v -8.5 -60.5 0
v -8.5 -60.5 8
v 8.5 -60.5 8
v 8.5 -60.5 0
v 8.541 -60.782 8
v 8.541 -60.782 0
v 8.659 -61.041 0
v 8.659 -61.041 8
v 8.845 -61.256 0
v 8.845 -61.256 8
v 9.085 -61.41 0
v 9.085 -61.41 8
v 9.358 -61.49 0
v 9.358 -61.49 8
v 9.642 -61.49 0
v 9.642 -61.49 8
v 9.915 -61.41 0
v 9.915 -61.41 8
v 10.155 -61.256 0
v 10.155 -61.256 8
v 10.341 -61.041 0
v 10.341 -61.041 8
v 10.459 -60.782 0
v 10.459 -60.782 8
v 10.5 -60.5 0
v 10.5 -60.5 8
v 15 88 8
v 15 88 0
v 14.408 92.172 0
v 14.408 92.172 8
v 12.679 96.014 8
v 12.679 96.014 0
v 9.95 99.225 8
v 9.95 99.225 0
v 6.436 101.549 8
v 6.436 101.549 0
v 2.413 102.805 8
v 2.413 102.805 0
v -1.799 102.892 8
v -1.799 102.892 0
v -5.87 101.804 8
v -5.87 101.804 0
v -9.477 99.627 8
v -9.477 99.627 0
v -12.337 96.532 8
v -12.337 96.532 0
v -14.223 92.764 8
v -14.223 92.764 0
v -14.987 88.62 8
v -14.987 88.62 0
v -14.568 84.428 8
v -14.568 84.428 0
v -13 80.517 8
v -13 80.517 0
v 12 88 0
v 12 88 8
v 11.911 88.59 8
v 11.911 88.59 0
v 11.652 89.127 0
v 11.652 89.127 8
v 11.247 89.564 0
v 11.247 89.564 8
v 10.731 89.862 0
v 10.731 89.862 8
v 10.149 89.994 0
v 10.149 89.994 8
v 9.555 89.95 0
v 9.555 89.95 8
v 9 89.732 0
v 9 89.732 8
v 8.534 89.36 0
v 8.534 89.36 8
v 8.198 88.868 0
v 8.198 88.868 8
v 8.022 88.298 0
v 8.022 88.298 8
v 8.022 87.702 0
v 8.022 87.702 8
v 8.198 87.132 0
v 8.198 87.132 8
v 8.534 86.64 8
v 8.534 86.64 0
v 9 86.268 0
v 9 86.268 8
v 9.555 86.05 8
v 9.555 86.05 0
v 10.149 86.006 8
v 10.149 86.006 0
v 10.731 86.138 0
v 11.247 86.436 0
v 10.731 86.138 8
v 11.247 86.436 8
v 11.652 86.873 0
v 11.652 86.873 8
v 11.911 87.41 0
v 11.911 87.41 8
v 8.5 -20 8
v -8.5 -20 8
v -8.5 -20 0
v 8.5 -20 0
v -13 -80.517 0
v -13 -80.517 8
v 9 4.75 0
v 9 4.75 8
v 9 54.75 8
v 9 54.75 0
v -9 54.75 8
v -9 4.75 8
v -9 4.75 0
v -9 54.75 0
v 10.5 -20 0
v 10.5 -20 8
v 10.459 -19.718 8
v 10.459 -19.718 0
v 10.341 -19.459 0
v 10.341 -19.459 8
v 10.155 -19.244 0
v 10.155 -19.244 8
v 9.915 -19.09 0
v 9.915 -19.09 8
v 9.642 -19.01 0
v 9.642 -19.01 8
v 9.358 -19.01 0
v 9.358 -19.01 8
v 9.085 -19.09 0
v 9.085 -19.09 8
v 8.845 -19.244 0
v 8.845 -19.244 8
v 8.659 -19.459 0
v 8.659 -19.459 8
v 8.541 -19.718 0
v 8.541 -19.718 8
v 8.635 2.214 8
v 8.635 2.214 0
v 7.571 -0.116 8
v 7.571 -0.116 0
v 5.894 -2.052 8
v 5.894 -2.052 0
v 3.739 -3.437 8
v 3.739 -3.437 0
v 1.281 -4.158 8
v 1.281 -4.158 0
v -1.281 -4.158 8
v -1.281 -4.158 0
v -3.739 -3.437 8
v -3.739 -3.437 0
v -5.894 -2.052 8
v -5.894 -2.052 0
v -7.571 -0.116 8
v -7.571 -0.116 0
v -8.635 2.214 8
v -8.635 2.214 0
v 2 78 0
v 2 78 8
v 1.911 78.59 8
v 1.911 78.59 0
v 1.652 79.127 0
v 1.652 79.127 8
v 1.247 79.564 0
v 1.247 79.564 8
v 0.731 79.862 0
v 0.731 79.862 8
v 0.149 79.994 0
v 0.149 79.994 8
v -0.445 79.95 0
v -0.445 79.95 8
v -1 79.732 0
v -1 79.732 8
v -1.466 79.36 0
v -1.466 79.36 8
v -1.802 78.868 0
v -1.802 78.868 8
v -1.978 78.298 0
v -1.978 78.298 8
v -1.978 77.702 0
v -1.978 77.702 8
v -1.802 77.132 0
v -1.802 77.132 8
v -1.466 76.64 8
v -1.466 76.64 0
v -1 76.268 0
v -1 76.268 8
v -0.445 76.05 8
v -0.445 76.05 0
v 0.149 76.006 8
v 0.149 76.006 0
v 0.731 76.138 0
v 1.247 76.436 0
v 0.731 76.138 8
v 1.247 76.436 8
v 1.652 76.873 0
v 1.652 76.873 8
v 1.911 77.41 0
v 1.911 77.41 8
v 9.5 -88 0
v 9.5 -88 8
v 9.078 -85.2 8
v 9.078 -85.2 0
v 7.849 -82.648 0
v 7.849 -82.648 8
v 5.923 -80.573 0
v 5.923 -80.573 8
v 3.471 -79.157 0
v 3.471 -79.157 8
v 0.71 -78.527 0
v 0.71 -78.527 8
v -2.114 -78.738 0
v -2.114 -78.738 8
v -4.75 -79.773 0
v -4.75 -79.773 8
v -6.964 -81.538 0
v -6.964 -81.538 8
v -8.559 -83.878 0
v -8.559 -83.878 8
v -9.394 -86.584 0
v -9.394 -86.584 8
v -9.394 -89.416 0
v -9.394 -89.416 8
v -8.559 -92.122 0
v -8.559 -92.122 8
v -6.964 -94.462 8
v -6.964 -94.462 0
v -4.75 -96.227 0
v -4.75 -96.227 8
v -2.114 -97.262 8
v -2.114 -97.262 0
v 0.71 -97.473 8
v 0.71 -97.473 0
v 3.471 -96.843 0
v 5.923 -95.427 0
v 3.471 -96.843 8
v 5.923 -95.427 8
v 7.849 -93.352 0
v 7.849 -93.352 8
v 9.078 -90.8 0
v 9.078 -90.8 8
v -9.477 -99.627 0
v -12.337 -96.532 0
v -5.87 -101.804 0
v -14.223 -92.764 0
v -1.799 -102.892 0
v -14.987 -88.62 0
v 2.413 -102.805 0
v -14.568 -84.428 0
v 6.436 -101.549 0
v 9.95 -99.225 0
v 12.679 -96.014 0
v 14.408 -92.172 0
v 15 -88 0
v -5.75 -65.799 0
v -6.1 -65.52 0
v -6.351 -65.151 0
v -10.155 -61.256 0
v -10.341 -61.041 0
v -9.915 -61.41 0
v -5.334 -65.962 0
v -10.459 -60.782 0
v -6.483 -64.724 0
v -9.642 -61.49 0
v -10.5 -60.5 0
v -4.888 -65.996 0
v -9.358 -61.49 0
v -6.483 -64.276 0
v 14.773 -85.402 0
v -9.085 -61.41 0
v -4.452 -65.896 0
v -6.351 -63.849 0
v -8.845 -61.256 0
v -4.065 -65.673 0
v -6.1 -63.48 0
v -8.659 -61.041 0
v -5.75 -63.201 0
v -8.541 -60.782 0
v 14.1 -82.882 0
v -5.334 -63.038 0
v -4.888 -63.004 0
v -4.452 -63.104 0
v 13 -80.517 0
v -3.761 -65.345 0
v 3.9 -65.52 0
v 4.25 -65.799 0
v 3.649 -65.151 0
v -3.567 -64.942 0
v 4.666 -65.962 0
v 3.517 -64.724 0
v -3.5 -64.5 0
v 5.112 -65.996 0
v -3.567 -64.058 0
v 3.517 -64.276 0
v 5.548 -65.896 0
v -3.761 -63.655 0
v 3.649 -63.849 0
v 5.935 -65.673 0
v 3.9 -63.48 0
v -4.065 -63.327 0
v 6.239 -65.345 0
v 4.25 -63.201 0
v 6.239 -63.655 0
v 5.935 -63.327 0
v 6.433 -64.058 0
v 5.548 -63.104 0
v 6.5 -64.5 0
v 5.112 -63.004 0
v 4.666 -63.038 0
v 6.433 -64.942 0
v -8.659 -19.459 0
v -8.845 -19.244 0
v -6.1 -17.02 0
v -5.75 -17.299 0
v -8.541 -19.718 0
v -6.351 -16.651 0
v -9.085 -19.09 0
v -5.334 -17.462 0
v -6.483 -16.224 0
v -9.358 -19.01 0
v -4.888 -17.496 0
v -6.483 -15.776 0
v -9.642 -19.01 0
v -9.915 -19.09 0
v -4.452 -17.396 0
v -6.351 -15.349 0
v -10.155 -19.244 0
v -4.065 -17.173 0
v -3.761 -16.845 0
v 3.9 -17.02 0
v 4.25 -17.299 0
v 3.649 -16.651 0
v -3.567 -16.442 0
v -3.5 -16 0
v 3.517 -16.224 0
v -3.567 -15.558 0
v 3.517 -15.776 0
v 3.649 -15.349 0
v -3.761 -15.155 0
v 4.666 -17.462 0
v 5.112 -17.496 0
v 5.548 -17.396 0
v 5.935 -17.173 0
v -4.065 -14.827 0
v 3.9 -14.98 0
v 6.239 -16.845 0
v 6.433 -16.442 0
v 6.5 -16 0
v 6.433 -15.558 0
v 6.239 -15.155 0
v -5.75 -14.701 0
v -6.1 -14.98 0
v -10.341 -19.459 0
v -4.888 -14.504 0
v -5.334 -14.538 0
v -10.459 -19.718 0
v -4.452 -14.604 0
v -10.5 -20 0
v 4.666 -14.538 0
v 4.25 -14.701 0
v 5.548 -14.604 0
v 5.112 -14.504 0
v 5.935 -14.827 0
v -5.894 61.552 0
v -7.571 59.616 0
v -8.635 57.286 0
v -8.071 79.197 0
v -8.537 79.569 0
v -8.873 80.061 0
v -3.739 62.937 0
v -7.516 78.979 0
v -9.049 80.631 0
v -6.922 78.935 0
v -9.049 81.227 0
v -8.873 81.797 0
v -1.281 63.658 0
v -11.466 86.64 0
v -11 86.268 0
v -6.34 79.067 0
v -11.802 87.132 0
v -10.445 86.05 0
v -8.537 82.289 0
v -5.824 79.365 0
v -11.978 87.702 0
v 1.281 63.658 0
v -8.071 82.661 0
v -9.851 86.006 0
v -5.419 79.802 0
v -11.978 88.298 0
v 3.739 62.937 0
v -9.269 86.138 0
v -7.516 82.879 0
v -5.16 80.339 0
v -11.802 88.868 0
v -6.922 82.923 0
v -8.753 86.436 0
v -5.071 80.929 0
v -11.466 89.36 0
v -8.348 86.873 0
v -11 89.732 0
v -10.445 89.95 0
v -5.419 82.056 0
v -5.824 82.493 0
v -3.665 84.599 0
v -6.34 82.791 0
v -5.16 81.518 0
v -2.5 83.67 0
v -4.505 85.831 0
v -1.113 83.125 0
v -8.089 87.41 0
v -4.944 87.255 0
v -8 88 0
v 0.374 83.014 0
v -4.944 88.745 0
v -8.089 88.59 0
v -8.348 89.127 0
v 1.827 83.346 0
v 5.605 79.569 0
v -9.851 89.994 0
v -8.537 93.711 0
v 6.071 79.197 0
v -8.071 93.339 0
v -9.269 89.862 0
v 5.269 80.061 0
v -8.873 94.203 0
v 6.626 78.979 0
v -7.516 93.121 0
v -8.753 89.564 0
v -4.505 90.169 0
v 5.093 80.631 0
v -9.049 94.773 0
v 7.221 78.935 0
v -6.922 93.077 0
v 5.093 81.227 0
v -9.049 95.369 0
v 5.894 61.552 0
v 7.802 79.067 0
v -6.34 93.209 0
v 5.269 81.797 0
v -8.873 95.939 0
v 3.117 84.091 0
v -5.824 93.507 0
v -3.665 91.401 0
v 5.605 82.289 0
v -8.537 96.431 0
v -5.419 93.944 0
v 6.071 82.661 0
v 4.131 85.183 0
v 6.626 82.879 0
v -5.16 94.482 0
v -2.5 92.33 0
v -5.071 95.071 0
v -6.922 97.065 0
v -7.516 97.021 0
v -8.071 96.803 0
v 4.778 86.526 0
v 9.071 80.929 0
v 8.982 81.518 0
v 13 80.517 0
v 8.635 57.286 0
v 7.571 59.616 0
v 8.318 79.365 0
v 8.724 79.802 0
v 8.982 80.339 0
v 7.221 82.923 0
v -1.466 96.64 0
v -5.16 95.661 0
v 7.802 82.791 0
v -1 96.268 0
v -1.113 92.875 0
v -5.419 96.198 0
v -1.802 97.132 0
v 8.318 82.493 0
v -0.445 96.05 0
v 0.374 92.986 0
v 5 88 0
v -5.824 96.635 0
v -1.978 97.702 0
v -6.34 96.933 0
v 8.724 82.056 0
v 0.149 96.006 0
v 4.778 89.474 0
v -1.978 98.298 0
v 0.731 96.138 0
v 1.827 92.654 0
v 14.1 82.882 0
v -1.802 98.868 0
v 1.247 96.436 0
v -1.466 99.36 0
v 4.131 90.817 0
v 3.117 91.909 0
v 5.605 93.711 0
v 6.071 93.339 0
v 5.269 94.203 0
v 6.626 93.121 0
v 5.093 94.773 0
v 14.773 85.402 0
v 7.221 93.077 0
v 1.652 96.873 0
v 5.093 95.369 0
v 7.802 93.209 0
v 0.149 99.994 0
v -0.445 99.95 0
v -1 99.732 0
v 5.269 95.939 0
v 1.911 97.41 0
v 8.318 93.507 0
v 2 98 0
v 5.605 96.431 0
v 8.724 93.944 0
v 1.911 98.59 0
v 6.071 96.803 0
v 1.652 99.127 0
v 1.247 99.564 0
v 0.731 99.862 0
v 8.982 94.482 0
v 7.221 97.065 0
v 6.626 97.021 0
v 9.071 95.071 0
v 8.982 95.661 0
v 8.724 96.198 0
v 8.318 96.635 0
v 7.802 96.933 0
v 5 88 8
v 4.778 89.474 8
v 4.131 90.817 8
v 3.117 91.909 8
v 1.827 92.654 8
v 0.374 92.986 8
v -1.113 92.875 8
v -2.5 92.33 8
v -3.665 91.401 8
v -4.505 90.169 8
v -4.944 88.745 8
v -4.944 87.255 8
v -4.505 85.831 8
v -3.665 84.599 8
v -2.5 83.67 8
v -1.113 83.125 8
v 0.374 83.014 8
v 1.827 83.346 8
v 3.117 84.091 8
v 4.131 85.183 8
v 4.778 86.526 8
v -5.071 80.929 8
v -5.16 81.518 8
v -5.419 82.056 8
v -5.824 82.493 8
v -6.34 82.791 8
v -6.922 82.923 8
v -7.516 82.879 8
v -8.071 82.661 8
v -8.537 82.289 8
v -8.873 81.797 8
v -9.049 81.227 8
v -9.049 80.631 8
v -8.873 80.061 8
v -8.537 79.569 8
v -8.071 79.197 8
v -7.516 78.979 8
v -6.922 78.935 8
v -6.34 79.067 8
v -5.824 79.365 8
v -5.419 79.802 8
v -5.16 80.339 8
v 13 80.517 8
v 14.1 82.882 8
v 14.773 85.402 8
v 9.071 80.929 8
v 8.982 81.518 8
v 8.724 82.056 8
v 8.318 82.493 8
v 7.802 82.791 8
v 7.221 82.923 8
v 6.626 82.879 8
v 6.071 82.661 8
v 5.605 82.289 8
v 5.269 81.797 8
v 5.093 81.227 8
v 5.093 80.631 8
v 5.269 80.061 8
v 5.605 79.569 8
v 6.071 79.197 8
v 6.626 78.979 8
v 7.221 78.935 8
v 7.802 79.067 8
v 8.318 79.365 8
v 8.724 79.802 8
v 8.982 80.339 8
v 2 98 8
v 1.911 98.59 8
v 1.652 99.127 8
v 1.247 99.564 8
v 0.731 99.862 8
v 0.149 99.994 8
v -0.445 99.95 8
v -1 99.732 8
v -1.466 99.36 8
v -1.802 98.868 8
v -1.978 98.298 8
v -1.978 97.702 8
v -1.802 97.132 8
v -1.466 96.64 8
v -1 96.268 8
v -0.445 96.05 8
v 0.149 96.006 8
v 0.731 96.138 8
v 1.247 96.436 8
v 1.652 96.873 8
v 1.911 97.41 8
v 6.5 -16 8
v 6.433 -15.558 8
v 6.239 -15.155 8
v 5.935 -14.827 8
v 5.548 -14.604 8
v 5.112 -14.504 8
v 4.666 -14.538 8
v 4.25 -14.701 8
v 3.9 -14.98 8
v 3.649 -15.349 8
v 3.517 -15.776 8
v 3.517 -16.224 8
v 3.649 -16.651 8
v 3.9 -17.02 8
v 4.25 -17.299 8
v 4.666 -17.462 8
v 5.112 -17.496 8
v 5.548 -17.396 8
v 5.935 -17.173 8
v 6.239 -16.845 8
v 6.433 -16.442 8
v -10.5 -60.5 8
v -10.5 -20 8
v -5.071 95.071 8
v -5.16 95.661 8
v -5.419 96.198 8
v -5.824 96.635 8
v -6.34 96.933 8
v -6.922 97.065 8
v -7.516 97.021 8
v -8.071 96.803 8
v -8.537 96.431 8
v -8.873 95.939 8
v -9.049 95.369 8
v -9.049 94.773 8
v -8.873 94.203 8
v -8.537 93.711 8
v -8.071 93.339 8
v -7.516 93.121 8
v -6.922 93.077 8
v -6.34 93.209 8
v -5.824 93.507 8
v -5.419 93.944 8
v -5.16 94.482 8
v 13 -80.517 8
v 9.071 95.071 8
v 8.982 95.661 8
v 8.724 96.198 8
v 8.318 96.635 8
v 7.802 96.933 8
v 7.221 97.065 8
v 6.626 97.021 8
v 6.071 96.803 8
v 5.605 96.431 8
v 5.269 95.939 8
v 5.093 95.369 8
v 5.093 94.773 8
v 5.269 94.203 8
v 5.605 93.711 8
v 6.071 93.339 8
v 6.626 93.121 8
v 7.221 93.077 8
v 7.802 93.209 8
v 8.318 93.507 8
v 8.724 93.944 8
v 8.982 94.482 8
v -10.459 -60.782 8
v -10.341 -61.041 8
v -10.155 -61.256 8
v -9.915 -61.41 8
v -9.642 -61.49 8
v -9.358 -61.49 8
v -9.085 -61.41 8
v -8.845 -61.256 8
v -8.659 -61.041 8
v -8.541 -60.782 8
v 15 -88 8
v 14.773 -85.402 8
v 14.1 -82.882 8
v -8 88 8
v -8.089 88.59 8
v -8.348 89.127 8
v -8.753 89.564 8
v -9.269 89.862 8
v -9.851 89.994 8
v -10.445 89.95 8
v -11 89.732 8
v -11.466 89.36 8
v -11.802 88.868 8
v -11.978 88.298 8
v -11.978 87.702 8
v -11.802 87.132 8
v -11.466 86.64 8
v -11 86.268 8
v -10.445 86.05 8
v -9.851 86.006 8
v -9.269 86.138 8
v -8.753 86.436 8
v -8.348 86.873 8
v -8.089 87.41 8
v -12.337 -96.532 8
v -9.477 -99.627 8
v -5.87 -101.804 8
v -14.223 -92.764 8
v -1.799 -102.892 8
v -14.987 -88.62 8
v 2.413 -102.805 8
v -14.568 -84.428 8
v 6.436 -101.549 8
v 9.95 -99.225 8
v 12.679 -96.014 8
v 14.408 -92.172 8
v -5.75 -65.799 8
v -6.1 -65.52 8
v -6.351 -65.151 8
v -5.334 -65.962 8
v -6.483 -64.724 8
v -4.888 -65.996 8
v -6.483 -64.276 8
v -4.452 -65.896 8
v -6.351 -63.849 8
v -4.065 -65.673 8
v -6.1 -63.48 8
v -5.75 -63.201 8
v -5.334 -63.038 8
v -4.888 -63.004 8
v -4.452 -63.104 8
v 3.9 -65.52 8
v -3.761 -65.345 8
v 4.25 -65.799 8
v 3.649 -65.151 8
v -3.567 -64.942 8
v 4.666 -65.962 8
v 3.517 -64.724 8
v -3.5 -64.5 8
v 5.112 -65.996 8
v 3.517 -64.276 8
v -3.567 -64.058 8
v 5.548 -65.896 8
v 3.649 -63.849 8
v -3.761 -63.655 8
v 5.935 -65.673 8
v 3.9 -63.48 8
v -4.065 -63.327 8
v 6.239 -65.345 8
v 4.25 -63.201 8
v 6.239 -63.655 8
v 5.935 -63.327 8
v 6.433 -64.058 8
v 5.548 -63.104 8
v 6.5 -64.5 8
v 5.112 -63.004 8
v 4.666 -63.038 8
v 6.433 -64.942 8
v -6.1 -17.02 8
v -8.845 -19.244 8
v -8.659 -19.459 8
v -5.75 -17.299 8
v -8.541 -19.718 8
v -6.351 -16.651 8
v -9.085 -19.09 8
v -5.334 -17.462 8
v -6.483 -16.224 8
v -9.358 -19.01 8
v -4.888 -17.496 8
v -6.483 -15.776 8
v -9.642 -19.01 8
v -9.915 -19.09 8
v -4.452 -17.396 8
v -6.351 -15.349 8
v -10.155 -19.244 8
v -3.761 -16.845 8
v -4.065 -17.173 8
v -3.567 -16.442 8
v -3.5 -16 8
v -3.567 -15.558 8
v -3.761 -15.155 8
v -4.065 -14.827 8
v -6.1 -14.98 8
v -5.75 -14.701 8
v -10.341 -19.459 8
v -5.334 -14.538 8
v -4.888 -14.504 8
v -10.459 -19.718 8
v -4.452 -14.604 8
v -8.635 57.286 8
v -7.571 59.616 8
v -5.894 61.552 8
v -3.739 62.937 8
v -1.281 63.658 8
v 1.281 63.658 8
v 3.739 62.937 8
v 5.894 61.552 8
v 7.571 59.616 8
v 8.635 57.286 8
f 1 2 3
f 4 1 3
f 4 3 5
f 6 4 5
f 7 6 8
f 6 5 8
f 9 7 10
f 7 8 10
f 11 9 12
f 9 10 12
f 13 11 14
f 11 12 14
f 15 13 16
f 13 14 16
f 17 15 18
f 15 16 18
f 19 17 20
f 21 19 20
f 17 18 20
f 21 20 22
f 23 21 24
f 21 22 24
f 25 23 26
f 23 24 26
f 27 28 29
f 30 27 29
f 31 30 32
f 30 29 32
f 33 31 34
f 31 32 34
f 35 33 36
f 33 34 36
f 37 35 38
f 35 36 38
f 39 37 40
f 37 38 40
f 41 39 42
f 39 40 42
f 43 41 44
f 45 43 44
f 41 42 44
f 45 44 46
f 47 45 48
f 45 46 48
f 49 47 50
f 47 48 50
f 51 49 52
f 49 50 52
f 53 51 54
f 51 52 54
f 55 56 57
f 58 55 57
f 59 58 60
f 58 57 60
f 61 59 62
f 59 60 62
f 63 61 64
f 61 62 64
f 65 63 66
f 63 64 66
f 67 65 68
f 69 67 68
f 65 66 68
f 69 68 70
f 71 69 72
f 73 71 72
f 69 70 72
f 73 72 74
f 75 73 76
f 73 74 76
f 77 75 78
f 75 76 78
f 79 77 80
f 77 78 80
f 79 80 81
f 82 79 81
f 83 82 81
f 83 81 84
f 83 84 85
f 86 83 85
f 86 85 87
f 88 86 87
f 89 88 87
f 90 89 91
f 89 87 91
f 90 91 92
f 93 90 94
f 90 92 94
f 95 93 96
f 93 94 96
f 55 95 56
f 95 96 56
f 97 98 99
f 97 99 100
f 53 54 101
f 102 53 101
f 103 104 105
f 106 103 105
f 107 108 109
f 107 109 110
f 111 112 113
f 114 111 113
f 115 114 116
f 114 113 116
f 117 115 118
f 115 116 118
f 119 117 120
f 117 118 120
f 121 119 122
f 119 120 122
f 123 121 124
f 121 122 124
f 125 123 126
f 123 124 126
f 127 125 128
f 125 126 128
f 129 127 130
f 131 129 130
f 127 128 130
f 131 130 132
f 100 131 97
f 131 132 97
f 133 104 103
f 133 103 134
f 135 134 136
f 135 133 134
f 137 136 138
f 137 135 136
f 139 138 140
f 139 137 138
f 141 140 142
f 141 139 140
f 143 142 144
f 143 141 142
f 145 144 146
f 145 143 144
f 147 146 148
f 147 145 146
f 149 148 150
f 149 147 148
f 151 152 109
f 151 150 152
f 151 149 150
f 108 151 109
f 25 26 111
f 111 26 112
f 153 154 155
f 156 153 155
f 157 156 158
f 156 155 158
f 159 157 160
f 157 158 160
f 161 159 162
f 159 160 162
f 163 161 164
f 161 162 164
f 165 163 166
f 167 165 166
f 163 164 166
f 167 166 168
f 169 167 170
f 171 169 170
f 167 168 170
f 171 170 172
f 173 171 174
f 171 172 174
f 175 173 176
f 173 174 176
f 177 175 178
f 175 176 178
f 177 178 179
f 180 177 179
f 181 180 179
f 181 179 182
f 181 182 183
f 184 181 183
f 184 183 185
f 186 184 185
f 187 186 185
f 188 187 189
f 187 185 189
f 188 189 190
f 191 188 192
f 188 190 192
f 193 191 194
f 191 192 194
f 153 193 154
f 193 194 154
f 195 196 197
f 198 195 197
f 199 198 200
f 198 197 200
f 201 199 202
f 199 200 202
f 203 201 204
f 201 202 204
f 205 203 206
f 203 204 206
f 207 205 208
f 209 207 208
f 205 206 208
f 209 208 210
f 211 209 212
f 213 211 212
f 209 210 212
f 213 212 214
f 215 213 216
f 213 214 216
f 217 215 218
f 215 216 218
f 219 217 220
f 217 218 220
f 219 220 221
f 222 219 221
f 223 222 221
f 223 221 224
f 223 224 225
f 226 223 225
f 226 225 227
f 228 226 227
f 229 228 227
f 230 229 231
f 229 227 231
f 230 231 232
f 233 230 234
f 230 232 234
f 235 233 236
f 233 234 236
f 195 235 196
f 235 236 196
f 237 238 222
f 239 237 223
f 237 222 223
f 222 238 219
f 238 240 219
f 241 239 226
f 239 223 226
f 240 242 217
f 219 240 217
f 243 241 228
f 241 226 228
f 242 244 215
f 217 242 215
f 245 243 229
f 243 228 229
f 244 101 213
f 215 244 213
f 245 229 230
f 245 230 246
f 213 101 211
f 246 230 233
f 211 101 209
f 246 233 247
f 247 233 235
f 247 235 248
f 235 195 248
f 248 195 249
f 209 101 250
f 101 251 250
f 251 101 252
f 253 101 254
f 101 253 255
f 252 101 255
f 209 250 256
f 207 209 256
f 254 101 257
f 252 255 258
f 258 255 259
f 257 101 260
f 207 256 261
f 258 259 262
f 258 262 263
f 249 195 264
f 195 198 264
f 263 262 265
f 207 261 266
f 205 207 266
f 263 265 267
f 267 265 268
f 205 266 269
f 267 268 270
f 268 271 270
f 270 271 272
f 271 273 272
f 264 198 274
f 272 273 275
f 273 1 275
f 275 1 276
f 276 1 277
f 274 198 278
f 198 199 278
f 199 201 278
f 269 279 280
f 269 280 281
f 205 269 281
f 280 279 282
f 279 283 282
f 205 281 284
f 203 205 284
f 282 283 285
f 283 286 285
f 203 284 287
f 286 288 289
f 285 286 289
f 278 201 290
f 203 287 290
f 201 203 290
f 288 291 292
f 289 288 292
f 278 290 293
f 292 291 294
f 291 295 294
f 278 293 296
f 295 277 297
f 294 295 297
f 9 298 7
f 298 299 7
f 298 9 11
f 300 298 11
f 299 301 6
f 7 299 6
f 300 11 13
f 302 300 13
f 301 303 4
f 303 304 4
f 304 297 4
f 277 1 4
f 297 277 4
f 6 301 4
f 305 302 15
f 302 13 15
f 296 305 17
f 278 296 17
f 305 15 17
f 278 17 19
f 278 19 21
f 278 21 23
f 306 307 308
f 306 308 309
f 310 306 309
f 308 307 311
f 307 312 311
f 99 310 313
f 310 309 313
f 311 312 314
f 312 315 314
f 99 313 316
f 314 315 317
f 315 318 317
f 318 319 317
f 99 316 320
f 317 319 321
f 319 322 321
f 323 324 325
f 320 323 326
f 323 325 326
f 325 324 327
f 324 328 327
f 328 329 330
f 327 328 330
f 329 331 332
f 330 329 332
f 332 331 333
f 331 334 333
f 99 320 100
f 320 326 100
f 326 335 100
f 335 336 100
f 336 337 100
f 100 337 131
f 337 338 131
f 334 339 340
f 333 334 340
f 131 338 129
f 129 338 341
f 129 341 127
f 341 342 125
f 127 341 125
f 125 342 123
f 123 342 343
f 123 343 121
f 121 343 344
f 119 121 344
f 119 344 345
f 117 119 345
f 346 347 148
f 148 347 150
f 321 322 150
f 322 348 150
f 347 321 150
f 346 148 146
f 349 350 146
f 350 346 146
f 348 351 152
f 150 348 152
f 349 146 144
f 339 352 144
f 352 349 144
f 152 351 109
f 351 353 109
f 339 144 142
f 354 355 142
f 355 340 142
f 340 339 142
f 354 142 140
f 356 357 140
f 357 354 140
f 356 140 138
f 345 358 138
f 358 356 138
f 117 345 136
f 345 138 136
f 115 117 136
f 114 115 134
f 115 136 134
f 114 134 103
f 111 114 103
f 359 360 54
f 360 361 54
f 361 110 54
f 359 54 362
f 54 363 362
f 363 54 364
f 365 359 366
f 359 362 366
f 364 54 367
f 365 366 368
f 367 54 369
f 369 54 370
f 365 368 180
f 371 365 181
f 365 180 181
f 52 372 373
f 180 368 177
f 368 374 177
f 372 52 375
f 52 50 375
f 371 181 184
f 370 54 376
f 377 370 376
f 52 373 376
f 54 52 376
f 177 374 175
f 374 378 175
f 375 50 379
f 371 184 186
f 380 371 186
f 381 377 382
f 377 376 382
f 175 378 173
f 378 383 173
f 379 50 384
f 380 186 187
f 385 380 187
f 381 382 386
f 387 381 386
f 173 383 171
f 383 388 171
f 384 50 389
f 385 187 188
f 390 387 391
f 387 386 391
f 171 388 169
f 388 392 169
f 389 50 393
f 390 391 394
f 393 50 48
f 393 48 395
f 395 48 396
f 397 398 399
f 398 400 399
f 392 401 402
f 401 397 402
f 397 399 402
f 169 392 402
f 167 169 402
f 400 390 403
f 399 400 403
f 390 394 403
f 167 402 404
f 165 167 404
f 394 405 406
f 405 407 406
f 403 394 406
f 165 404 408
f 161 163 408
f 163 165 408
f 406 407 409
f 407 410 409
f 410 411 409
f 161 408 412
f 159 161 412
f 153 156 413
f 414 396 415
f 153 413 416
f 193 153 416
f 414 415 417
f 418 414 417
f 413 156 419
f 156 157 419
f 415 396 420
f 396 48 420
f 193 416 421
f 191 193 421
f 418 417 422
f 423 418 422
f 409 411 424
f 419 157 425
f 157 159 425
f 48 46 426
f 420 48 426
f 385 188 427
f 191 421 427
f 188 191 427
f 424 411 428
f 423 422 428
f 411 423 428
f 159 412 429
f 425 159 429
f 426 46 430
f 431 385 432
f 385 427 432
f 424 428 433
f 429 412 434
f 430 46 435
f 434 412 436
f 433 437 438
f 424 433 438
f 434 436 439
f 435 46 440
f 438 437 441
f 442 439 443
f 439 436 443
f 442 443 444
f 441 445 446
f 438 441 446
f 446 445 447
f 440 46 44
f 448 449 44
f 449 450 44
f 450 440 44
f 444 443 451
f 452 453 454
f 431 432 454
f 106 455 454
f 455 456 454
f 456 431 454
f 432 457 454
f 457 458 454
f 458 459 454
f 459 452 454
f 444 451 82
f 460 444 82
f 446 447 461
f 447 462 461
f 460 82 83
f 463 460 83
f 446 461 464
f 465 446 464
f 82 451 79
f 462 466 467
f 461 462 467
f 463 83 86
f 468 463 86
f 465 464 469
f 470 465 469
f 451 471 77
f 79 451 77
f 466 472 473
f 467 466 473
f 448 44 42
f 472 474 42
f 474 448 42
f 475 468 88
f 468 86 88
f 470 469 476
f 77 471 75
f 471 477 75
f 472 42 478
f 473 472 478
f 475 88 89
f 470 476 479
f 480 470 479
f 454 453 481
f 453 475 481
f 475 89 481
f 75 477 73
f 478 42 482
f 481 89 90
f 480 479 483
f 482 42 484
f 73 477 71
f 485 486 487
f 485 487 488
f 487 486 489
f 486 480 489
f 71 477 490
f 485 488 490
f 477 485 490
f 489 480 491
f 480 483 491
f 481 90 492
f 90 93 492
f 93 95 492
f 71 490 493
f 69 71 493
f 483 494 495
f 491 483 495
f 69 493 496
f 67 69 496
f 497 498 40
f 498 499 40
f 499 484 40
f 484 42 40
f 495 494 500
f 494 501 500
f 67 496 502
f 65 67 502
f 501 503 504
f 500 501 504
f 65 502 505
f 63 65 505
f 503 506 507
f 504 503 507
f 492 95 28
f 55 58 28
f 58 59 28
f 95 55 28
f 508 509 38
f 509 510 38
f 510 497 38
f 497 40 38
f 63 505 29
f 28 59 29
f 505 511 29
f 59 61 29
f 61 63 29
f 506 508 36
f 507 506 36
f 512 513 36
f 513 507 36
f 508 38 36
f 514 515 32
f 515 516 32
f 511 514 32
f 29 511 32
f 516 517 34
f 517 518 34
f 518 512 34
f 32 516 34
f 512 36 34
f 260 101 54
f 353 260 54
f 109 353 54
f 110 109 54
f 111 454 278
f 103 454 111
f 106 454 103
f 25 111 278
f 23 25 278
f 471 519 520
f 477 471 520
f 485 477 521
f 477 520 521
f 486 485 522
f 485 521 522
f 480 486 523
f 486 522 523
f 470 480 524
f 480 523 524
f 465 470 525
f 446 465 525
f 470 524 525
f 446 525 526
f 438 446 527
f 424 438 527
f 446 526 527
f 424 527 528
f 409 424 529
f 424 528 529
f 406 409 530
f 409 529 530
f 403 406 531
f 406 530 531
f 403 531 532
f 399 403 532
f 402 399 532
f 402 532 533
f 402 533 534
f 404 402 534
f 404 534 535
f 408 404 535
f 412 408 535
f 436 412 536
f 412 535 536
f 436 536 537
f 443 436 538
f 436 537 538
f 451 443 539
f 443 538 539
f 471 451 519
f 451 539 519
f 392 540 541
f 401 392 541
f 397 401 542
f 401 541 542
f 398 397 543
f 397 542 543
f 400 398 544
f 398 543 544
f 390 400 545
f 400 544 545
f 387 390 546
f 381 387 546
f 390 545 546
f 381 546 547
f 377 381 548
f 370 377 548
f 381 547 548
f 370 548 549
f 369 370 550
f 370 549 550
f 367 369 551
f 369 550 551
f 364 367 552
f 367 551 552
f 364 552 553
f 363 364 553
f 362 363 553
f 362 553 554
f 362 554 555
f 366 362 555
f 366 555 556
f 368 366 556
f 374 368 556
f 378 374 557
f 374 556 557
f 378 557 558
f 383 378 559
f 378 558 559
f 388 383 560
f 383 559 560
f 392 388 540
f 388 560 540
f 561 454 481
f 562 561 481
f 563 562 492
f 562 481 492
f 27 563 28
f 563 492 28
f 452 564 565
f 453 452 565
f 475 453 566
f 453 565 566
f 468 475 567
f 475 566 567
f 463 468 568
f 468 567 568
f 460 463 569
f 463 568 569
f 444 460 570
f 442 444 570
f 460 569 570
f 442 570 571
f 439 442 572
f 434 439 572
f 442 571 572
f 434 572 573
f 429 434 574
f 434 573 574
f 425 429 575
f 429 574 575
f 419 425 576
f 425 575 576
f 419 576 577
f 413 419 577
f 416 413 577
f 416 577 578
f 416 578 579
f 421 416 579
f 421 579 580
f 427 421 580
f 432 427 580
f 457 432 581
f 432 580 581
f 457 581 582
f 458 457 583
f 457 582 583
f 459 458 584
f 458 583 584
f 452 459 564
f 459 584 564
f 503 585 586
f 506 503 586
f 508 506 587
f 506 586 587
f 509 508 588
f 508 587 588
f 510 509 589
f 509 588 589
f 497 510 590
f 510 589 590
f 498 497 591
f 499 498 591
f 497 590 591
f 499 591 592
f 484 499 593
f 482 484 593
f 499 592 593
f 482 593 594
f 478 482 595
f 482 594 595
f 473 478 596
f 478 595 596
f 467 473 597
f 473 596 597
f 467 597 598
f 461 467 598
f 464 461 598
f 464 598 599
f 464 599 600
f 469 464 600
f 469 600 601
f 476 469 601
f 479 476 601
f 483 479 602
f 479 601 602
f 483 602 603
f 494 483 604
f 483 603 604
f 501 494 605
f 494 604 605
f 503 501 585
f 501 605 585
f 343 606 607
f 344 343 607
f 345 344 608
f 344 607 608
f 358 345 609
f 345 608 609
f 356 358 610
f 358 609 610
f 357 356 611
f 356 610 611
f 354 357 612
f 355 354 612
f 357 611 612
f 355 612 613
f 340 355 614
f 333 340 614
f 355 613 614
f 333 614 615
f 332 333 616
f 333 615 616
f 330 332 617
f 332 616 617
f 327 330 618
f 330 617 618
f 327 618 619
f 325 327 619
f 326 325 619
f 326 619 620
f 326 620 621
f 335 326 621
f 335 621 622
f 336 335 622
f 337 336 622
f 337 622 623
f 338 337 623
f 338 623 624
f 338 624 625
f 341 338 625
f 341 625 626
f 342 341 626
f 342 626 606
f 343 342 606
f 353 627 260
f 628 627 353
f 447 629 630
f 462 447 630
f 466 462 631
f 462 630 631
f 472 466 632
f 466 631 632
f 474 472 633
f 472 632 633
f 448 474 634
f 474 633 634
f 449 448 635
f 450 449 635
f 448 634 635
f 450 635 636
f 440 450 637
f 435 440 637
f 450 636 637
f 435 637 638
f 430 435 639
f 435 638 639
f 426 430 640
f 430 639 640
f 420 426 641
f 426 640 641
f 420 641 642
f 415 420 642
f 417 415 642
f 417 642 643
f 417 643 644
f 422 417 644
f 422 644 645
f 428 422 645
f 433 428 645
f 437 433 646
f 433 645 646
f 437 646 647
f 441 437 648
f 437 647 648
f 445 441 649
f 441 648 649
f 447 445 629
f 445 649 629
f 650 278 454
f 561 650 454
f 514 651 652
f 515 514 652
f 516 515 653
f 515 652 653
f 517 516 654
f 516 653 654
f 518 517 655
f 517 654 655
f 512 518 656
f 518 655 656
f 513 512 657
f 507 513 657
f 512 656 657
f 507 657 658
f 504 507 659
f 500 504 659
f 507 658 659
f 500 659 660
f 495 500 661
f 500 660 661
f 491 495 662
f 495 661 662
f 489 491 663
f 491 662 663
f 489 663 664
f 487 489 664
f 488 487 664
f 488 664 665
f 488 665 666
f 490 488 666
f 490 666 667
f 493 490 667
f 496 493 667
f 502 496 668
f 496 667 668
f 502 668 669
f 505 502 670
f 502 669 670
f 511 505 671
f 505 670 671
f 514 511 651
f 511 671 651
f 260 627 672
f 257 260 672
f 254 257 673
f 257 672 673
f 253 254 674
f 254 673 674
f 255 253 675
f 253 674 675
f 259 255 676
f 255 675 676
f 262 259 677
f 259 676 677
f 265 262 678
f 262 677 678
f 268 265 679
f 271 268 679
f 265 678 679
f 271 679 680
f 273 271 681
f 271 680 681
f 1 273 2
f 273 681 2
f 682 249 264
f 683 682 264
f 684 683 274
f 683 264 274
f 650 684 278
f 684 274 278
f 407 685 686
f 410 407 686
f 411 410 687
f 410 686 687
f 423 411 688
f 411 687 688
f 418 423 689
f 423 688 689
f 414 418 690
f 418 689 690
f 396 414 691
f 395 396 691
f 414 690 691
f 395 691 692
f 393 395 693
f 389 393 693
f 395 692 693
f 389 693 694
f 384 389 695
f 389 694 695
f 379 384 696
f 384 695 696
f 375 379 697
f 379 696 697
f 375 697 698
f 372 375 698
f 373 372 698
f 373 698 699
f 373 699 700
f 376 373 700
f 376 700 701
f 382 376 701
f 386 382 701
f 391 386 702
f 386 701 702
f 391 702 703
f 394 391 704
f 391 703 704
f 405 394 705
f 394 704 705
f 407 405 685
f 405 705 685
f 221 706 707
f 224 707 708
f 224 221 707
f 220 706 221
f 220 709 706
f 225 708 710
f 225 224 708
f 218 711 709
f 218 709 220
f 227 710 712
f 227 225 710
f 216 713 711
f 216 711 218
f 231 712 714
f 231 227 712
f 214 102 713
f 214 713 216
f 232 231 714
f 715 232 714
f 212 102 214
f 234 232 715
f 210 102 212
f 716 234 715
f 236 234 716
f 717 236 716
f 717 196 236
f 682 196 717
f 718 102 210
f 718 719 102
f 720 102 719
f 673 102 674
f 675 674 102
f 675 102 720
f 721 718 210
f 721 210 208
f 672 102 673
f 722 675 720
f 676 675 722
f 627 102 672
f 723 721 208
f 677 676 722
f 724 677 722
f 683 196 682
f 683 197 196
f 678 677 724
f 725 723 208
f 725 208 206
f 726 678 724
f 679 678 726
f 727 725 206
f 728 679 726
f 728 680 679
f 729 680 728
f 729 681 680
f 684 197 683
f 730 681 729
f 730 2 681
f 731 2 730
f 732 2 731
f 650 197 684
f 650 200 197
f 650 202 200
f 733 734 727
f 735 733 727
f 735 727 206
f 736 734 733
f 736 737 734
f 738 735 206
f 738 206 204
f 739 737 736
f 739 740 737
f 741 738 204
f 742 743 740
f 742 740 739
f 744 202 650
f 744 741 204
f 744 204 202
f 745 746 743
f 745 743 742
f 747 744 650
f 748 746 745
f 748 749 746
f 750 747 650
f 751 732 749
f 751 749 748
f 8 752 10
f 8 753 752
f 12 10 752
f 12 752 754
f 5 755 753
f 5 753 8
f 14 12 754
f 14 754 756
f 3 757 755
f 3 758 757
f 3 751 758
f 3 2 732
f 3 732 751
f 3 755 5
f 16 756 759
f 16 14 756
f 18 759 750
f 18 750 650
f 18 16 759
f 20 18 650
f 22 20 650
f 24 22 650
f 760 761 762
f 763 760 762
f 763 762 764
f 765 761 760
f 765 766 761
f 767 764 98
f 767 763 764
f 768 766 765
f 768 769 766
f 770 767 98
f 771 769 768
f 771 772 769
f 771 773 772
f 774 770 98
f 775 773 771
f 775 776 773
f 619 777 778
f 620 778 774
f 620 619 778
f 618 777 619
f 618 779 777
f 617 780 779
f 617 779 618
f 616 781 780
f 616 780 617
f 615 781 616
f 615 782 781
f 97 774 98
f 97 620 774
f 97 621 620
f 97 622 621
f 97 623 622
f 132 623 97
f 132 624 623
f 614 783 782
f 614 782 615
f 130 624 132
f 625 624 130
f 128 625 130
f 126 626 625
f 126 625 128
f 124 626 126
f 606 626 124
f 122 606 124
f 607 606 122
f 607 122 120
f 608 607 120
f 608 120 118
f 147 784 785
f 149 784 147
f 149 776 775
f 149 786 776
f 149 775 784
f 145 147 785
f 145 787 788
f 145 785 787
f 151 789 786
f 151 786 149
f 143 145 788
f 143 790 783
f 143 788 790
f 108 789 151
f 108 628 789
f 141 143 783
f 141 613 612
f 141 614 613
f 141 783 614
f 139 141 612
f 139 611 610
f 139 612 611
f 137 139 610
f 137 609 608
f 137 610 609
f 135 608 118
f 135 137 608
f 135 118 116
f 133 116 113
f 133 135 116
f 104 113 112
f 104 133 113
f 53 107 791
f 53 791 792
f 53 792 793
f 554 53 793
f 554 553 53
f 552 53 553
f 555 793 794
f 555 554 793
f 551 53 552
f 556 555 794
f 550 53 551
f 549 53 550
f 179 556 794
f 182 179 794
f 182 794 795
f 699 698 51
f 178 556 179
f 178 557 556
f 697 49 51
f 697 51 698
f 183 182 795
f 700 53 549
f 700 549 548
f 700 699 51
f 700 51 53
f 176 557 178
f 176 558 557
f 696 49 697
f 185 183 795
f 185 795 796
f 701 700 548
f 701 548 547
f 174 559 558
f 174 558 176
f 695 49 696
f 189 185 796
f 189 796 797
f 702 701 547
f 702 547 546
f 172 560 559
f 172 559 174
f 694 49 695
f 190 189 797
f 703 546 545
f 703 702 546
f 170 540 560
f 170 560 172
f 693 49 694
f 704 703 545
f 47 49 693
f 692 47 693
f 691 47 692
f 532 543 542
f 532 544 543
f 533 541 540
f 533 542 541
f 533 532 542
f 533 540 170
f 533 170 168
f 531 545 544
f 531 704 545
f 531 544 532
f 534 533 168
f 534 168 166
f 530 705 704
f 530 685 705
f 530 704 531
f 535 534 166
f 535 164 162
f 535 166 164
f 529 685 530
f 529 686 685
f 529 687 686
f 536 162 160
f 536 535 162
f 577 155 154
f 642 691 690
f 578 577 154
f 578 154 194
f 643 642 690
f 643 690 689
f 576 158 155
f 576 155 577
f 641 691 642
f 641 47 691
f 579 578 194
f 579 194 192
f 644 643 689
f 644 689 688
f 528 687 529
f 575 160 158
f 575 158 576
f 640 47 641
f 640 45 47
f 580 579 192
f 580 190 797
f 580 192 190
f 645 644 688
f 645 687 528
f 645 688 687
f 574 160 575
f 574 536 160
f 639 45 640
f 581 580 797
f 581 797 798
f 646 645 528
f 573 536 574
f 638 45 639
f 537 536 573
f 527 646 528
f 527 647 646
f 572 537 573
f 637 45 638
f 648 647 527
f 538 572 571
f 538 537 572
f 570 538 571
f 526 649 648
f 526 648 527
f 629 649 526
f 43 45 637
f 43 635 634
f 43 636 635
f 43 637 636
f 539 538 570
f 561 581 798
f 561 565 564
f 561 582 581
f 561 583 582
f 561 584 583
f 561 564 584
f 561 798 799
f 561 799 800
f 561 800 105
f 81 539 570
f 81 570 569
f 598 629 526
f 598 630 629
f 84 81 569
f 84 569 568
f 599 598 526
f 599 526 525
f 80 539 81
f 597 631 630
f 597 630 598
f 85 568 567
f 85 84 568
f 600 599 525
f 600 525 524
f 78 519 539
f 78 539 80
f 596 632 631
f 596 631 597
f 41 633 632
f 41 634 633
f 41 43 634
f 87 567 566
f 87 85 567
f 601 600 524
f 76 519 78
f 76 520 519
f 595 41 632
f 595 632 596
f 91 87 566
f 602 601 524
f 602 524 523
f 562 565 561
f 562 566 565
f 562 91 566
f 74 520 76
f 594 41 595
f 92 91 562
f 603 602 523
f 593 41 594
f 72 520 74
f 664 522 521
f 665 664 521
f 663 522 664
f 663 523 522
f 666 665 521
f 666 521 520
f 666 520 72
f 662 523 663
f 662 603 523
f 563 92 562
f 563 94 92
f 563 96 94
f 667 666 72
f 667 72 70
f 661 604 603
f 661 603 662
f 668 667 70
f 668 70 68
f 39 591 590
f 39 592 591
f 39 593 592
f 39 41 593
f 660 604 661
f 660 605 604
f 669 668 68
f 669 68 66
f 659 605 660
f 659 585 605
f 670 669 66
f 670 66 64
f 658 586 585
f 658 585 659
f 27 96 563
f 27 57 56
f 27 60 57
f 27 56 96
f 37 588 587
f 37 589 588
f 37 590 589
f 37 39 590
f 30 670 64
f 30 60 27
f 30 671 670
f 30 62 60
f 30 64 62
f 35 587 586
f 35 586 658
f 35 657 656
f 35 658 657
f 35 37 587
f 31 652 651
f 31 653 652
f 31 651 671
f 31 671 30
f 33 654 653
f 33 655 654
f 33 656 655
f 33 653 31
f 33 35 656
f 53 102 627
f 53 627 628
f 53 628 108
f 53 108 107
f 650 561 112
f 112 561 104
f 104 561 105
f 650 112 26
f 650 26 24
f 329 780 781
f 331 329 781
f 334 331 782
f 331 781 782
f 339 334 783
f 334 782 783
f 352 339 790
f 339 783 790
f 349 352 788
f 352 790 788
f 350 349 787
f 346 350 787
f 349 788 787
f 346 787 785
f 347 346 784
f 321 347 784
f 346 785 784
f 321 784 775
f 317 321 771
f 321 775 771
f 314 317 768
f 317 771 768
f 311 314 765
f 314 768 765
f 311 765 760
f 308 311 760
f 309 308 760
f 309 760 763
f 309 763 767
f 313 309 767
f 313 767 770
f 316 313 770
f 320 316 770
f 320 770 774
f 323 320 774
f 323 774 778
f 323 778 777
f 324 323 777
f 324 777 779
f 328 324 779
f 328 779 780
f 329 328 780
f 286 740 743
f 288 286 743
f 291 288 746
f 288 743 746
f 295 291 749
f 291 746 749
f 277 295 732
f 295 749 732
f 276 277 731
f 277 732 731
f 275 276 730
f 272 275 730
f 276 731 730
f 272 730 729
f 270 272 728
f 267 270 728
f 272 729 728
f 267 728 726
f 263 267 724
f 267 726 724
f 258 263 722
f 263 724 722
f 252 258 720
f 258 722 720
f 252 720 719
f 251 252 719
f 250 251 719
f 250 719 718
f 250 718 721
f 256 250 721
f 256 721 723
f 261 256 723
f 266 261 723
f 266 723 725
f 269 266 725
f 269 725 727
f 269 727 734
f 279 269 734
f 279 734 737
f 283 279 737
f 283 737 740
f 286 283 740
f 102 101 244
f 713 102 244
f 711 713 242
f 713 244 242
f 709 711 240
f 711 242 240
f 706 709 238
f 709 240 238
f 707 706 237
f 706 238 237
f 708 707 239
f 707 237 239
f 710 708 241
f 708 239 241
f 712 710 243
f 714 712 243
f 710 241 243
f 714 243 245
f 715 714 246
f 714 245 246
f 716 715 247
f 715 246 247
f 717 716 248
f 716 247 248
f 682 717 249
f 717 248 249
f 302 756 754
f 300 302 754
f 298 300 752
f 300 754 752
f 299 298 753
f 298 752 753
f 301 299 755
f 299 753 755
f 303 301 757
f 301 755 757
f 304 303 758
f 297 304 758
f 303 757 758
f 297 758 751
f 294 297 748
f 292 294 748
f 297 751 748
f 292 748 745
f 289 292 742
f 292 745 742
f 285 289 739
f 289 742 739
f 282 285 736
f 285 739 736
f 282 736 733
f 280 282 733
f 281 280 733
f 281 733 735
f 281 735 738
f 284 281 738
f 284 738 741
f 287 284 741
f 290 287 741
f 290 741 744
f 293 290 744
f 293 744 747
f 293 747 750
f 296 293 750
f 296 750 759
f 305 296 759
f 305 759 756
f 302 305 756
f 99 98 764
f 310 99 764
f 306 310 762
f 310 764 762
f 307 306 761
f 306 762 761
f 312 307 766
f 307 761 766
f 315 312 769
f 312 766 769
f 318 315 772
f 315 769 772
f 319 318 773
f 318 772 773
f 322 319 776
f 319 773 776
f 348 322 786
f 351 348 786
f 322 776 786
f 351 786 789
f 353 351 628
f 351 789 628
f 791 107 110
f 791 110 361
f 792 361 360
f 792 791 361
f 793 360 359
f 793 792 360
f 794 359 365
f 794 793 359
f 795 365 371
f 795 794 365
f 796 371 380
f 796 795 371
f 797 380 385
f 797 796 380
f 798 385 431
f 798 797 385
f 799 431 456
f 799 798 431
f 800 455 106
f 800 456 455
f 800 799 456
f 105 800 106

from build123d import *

# Parameters (mm, degrees)
EXTRUDE_1_DEPTH     = 8
SKETCH_2_R          = 5
SKETCH_2_R_2        = 2
SKETCH_2_R_3        = 9.5
CUT_EXTRUDE_1_DEPTH = 8
SKETCH_3_W          = 21
SKETCH_3_H          = 40.5
CUT_EXTRUDE_2_DEPTH = 10
SKETCH_4_R          = 1.5
CUT_EXTRUDE_3_DEPTH = 10
SKETCH_5_R          = 1
CUT_EXTRUDE_4_DEPTH = 10
SKETCH_6_W          = 18
SKETCH_6_H          = 50
CUT_EXTRUDE_5_DEPTH = 10


with BuildPart() as part:
    # 草图1 → 凸台-拉伸1 (new body)
    with BuildSketch(Plane.XY):
        with BuildLine():
            ThreePointArc((13, 80.516685226), (0, 73), (-13, 80.516685226))
            Line((-13, 80.516685226), (-13, -80.516685226))
            ThreePointArc((-13, -80.516685226), (0, -73), (13, -80.516685226))
            Line((13, -80.516685226), (13, 80.516685226))
        make_face()
        with BuildLine():
            Line((-13, 80.516685226), (-13, 88))
            Line((-13, 88), (13, 88))
            Line((13, 88), (13, 80.516685226))
            ThreePointArc((13, 80.516685226), (14.491376746, 84.127016654), (15, 88))
            ThreePointArc((15, 88), (-3.872983346, 102.491376746), (-13, 80.516685226))
        make_face()
        with BuildLine():
            Line((13, 88), (-13, 88))
            Line((-13, 88), (-13, 80.516685226))
            ThreePointArc((-13, 80.516685226), (0, 73), (13, 80.516685226))
            Line((13, 80.516685226), (13, 88))
        make_face()
        with BuildLine():
            ThreePointArc((13, -80.516685226), (0, -73), (-13, -80.516685226))
            Line((-13, -80.516685226), (-13, -88))
            Line((-13, -88), (13, -88))
            Line((13, -88), (13, -80.516685226))
        make_face()
        with BuildLine():
            Line((-13, -88), (-13, -80.516685226))
            ThreePointArc((-13, -80.516685226), (-3.872983346, -102.491376746), (15, -88))
            ThreePointArc((15, -88), (14.491376746, -84.127016654), (13, -80.516685226))
            Line((13, -80.516685226), (13, -88))
            Line((13, -88), (-13, -88))
        make_face()
    extrude(amount=EXTRUDE_1_DEPTH)

    # 草图2 → 切除-拉伸1 (cut)
    with BuildSketch(Plane.XY.offset(8)):
        with Locations((0, 88)):
            Circle(SKETCH_2_R)
        with Locations((0, 98)):
            Circle(SKETCH_2_R_2)
        with Locations((10, 88)):
            Circle(SKETCH_2_R_2)
        with Locations((0, 78)):
            Circle(SKETCH_2_R_2)
        with Locations((-10, 88)):
            Circle(SKETCH_2_R_2)
        with Locations((0, -88)):
            Circle(SKETCH_2_R_3)
        with Locations((7.071067812, 95.071067812)):
            Circle(SKETCH_2_R_2)
        with Locations((7.071067812, 80.928932188)):
            Circle(SKETCH_2_R_2)
        with Locations((-7.071067812, 80.928932188)):
            Circle(SKETCH_2_R_2)
        with Locations((-7.071067812, 95.071067812)):
            Circle(SKETCH_2_R_2)
    extrude(amount=-CUT_EXTRUDE_1_DEPTH, mode=Mode.SUBTRACT)

    # 草图3 → 切除-拉伸2 (cut)
    with BuildSketch(Plane.XY.offset(8)):
        with Locations((0, -40.25)):
            Rectangle(SKETCH_3_W, SKETCH_3_H)
    extrude(amount=-CUT_EXTRUDE_2_DEPTH, mode=Mode.SUBTRACT)

    # 草图4 → 切除-拉伸3 (cut)
    with BuildSketch(Plane.XY.offset(8)):
        with Locations((-5, -16)):
            Circle(SKETCH_4_R)
        with Locations((5, -16)):
            Circle(SKETCH_4_R)
        with Locations((-5, -64.5)):
            Circle(SKETCH_4_R)
        with Locations((5, -64.5)):
            Circle(SKETCH_4_R)
    extrude(amount=-CUT_EXTRUDE_3_DEPTH, mode=Mode.SUBTRACT)

    # 草图5 → 切除-拉伸4 (cut)
    with BuildSketch(Plane.XY.offset(8)):
        with Locations((-9.5, -20)):
            Circle(SKETCH_5_R)
        with Locations((9.5, -20)):
            Circle(SKETCH_5_R)
        with Locations((9.5, -60.5)):
            Circle(SKETCH_5_R)
        with Locations((-9.5, -60.5)):
            Circle(SKETCH_5_R)
    extrude(amount=-CUT_EXTRUDE_4_DEPTH, mode=Mode.SUBTRACT)

    # 草图6 → 切除-拉伸5 (cut)
    with BuildSketch(Plane.XY.offset(8)):
        with BuildLine():
            ThreePointArc((-9, 54.75), (0, 63.75), (9, 54.75))
            Line((9, 54.75), (-9, 54.75))
        make_face()
        with Locations((0, 29.75)):
            Rectangle(SKETCH_6_W, SKETCH_6_H)
        with BuildLine():
            Line((-9, 4.75), (9, 4.75))
            ThreePointArc((9, 4.75), (0, -4.25), (-9, 4.75))
        make_face()
    extrude(amount=-CUT_EXTRUDE_5_DEPTH, mode=Mode.SUBTRACT)


solid = part.part
